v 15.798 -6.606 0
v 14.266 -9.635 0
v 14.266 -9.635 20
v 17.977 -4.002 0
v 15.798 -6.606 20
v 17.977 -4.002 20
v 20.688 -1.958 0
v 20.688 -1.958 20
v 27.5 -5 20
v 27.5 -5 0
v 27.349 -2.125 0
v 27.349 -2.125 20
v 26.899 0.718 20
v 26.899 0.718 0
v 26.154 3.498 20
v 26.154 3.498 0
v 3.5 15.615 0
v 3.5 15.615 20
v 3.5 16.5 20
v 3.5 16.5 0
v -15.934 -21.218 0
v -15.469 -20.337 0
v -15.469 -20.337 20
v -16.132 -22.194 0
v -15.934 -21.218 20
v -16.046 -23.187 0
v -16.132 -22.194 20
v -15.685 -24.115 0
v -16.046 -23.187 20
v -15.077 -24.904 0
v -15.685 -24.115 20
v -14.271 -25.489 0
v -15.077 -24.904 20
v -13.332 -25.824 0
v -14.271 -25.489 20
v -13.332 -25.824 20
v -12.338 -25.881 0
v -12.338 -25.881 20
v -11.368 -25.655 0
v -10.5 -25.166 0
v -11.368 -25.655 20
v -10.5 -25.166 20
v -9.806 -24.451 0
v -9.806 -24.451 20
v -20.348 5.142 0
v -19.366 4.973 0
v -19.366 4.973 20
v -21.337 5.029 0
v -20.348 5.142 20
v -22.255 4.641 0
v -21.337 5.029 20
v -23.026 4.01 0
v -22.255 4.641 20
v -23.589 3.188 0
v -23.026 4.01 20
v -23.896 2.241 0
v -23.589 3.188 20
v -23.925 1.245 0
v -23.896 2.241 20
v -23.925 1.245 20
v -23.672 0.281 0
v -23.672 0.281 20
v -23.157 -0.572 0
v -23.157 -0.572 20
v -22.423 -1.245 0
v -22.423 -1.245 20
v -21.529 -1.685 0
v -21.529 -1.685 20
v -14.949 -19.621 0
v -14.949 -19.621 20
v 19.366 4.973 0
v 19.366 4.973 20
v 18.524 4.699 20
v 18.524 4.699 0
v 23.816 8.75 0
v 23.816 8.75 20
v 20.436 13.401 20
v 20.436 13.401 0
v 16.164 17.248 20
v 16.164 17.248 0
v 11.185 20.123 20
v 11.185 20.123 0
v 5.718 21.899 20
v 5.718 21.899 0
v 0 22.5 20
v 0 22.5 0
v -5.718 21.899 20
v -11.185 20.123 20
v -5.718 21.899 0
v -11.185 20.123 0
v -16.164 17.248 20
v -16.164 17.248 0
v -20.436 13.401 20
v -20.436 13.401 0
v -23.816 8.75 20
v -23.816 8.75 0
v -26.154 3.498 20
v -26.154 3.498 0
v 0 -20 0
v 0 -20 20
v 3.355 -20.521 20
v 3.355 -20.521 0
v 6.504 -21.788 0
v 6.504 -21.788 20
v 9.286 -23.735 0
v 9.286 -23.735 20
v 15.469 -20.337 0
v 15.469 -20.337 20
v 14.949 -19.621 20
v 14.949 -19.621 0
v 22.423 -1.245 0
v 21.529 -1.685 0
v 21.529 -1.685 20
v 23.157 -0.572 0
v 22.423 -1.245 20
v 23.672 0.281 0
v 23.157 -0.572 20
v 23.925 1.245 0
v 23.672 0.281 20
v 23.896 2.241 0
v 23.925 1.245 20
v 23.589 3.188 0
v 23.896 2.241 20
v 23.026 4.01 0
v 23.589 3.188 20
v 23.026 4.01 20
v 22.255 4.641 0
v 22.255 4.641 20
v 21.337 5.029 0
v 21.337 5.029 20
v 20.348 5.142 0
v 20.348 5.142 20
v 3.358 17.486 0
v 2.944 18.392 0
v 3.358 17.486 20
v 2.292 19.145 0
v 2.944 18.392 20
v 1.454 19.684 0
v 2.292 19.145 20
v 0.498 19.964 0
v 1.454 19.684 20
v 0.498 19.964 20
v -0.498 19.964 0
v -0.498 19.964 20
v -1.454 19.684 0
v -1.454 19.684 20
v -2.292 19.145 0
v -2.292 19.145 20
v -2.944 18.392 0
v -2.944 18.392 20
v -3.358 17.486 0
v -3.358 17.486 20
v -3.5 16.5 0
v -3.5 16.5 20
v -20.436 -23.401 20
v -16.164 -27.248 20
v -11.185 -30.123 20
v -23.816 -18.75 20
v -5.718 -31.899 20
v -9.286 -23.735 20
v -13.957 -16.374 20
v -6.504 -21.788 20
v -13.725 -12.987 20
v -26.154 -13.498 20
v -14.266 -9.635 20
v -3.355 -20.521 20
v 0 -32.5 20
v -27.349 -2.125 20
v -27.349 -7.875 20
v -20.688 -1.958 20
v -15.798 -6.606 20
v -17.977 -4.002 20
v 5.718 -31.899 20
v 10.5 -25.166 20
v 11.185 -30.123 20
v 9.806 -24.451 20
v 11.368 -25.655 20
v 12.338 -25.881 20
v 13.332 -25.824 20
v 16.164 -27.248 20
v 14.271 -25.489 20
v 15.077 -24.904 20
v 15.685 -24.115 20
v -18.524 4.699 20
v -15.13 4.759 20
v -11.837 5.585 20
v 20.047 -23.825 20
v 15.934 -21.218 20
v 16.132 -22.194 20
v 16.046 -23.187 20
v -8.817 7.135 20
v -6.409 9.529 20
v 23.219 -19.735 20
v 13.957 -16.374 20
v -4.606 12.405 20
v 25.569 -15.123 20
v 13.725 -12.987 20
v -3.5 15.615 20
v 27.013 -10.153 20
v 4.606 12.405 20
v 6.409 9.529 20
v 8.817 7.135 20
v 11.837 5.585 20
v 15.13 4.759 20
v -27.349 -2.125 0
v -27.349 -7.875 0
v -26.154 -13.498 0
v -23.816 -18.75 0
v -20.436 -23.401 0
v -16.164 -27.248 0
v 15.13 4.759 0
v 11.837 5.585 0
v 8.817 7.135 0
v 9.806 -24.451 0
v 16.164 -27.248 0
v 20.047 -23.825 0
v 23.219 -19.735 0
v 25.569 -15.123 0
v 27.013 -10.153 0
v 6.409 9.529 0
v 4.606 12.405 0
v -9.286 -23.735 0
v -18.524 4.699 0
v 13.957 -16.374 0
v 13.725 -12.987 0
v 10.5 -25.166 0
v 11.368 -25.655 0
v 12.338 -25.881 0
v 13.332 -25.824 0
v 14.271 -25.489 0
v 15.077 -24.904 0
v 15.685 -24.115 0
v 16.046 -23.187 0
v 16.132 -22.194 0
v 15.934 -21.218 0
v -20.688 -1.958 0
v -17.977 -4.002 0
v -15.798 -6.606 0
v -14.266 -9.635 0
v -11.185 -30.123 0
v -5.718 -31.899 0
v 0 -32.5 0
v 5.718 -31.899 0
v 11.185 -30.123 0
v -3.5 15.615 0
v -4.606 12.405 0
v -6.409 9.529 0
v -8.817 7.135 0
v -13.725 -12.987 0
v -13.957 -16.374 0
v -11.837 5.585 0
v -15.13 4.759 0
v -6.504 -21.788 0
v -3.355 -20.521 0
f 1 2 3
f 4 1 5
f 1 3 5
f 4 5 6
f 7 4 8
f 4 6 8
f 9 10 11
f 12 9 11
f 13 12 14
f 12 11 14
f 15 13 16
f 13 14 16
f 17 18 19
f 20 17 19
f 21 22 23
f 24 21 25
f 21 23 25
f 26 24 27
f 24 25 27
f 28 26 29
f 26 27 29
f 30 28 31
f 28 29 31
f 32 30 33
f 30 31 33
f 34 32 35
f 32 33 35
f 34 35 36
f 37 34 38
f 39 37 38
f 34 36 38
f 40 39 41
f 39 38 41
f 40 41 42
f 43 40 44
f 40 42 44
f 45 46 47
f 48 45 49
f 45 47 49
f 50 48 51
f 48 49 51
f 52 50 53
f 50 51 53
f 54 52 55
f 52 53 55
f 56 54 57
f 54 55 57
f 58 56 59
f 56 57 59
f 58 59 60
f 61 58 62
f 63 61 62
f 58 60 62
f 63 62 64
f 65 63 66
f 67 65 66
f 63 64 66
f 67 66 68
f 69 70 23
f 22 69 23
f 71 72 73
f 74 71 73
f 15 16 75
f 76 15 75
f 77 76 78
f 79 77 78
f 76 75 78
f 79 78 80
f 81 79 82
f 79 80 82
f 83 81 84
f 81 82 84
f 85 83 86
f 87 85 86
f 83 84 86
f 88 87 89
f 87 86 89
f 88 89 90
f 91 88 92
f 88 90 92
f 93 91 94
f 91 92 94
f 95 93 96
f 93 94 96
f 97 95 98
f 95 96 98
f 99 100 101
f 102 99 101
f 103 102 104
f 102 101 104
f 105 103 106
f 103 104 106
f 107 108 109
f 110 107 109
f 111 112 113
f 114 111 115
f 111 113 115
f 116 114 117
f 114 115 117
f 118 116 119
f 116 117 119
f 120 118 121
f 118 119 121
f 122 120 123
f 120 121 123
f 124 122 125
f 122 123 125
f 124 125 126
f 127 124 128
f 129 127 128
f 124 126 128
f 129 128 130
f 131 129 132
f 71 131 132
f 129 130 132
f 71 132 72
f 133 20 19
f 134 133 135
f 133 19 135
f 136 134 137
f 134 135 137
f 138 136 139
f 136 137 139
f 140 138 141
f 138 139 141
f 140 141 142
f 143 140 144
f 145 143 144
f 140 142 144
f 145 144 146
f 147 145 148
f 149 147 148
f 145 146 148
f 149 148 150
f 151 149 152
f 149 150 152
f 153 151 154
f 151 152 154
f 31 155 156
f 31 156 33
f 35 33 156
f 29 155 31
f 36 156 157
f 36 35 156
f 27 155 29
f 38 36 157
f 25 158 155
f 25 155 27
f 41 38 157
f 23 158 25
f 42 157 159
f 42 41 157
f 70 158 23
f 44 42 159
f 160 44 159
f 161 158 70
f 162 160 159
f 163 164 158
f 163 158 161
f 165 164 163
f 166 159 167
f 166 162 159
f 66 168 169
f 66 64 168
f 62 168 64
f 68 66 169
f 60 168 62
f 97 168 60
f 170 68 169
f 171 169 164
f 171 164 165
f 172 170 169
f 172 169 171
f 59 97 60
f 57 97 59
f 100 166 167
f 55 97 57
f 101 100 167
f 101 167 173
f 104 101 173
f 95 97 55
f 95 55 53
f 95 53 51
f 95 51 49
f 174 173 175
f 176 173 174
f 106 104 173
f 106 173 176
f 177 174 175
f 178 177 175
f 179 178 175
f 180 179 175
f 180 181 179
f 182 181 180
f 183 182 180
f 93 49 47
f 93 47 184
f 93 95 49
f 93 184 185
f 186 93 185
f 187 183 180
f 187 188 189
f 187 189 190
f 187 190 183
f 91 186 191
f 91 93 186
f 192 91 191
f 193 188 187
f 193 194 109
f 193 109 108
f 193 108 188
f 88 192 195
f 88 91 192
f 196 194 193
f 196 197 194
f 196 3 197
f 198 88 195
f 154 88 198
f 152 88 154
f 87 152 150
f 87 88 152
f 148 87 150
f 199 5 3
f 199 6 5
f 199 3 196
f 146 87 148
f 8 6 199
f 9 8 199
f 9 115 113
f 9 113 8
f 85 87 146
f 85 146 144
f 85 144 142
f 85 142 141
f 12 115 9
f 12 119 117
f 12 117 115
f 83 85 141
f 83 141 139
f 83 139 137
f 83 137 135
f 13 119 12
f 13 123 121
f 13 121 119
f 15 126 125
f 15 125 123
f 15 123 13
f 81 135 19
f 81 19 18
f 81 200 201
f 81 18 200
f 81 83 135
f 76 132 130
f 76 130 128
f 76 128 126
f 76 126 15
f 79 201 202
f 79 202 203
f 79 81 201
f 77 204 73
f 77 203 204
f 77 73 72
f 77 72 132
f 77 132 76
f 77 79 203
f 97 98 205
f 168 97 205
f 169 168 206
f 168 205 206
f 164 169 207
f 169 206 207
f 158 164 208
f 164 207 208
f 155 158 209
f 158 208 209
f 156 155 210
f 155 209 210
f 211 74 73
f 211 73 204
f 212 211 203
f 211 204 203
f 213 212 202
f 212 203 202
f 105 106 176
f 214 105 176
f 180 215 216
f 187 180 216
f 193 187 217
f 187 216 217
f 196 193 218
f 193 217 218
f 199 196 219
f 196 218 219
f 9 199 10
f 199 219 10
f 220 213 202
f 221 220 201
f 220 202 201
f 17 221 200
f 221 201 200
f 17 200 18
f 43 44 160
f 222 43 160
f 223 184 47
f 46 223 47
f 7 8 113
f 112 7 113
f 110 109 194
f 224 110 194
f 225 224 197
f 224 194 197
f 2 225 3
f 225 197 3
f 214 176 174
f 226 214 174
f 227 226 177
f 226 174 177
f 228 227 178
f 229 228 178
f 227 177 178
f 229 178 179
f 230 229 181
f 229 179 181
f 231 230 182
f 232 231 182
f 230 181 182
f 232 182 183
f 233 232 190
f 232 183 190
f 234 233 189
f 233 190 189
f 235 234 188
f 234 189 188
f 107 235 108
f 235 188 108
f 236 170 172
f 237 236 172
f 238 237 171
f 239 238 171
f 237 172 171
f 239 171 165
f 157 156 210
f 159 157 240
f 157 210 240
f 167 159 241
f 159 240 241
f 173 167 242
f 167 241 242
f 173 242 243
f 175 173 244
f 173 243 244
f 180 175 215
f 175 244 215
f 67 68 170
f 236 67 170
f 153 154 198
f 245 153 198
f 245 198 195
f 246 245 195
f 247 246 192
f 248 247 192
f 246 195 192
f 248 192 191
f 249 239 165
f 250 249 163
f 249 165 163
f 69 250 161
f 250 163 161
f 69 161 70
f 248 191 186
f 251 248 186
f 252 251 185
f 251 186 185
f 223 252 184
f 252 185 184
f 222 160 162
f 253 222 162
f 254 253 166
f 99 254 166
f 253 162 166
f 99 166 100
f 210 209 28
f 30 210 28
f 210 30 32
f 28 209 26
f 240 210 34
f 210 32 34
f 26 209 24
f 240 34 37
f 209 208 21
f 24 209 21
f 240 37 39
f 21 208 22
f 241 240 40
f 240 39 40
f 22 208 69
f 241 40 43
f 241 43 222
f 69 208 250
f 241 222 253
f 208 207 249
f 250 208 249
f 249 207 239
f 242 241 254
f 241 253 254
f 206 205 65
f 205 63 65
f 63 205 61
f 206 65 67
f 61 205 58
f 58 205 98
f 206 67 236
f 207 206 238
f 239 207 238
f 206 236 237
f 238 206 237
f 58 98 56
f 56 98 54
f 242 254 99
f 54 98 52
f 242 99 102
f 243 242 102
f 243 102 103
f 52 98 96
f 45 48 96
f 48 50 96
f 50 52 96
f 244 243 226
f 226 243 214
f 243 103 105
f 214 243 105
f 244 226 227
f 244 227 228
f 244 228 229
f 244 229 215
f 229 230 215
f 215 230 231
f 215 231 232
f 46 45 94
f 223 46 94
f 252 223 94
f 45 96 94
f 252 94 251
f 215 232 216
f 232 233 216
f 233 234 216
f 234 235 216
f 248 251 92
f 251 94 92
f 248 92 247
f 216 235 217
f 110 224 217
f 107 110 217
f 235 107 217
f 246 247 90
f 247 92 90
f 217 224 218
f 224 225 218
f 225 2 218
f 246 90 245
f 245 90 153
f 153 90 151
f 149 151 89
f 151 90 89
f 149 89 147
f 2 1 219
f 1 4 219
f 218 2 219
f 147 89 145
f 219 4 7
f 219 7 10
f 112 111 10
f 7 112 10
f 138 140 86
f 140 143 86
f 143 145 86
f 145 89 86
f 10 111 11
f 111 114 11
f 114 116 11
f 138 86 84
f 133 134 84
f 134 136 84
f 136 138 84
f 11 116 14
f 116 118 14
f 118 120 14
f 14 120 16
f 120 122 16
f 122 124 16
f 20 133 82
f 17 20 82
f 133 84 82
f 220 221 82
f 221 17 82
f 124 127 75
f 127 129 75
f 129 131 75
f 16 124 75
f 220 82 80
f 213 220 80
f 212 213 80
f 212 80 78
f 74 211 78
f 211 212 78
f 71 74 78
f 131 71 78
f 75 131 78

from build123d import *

# Parameters (mm, degrees)
F2_DEPTH = 25
F3_DEPTH = 20
F4_DEPTH = 25


with BuildPart() as f2:
    # F1 (on Top) → F2 (new body)
    with BuildSketch(Plane.XY):
        with BuildLine():
            ThreePointArc((-8.8167787844, 7.1352549156), (-13.4599944512, 5.0779075669), (-18.5244405716, 4.6990733883))
            Line((-18.5244405716, 4.6990733883), (-19.36615562, 4.9725631861))
            ThreePointArc((-19.36615562, 4.9725631861), (-23.7764129074, 2.7254248594), (-21.5292745807, -1.684832428))
            Line((-21.5292745807, -1.684832428), (-20.6875595323, -1.9583222258))
            ThreePointArc((-20.6875595323, -1.9583222258), (-16.813009697, -5.241612255), (-14.2658477444, -9.6352549156))
            ThreePointArc((-14.2658477444, -9.6352549156), (-13.7440266917, -14.6869707262), (-14.9487338959, -19.6206114097))
            Line((-14.9487338959, -19.6206114097), (-15.4689424046, -20.336616996))
            ThreePointArc((-15.4689424046, -20.336616996), (-14.6946313073, -25.2254248594), (-9.805823444, -24.4511137621))
            Line((-9.805823444, -24.4511137621), (-9.2856149352, -23.7351081758))
            ThreePointArc((-9.2856149352, -23.7351081758), (-4.9657188134, -21.0647847237), (0, -20))
            ThreePointArc((0, -20), (4.9657188134, -21.0647847237), (9.2856149352, -23.7351081758))
            Line((9.2856149352, -23.7351081758), (9.805823444, -24.4511137621))
            ThreePointArc((9.805823444, -24.4511137621), (14.6946313073, -25.2254248594), (15.4689424046, -20.336616996))
            Line((15.4689424046, -20.336616996), (14.9487338959, -19.6206114097))
            ThreePointArc((14.9487338959, -19.6206114097), (13.7440266917, -14.6869707262), (14.2658477444, -9.6352549156))
            ThreePointArc((14.2658477444, -9.6352549156), (16.813009697, -5.241612255), (20.6875595323, -1.9583222258))
            Line((20.6875595323, -1.9583222258), (21.5292745807, -1.684832428))
            ThreePointArc((21.5292745807, -1.684832428), (23.7764129074, 2.7254248594), (19.36615562, 4.9725631861))
            Line((19.36615562, 4.9725631861), (18.5244405716, 4.6990733883))
            ThreePointArc((18.5244405716, 4.6990733883), (13.4599944512, 5.0779075669), (8.8167787844, 7.1352549156))
            ThreePointArc((8.8167787844, 7.1352549156), (5.4252926325, 10.915460138), (3.5, 15.614968423))
            Line((3.5, 15.614968423), (3.5, 16.5))
            ThreePointArc((3.5, 16.5), (0, 20), (-3.5, 16.5))
            Line((-3.5, 16.5), (-3.5, 15.614968423))
            ThreePointArc((-3.5, 15.614968423), (-5.4252926325, 10.915460138), (-8.8167787844, 7.1352549156))
        make_face()
    extrude(amount=F2_DEPTH)

    # F0 (on Top) → F3 (join)
    with BuildSketch(Plane.XY):
        with BuildLine():
            ThreePointArc((16.164094438, -27.2479673453), (24.5026794152, -17.4847387428), (27.5, -5))
            ThreePointArc((27.5, -5), (27.1614293664, -0.6980522114), (26.1540541981, 3.4979673453))
            Line((26.1540541981, 3.4979673453), (23.7764129074, 2.7254248594))
            Line((23.7764129074, 2.7254248594), (0, -5))
            Line((0, -5), (14.6946313073, -25.2254248594))
            Line((14.6946313073, -25.2254248594), (16.164094438, -27.2479673453))
        make_face()
        with BuildLine():
            Line((23.7764129074, 2.7254248594), (26.1540541981, 3.4979673453))
            ThreePointArc((26.1540541981, 3.4979673453), (0, 22.5), (-26.1540541981, 3.4979673453))
            Line((-26.1540541981, 3.4979673453), (-23.7764129074, 2.7254248594))
            Line((-23.7764129074, 2.7254248594), (0, -5))
            Line((0, -5), (23.7764129074, 2.7254248594))
        make_face()
        with BuildLine():
            ThreePointArc((-16.164094438, -27.2479673453), (0, -32.5), (16.164094438, -27.2479673453))
            Line((16.164094438, -27.2479673453), (14.6946313073, -25.2254248594))
            Line((14.6946313073, -25.2254248594), (0, -5))
            Line((0, -5), (-14.6946313073, -25.2254248594))
            Line((-14.6946313073, -25.2254248594), (-16.164094438, -27.2479673453))
        make_face()
        with BuildLine():
            Line((-23.7764129074, 2.7254248594), (-26.1540541981, 3.4979673453))
            ThreePointArc((-26.1540541981, 3.4979673453), (-26.1540541981, -13.4979673453), (-16.164094438, -27.2479673453))
            Line((-16.164094438, -27.2479673453), (-14.6946313073, -25.2254248594))
            Line((-14.6946313073, -25.2254248594), (0, -5))
            Line((0, -5), (-23.7764129074, 2.7254248594))
        make_face()
    extrude(amount=F3_DEPTH)

    # F4 (cut): a face of the model
    f4_faces = [f2.faces().sort_by_distance(p)[0] for p in [
        (0, -5, 25),
    ]]
    extrude(f4_faces, amount=-F4_DEPTH, mode=Mode.SUBTRACT)


solid = f2.part
